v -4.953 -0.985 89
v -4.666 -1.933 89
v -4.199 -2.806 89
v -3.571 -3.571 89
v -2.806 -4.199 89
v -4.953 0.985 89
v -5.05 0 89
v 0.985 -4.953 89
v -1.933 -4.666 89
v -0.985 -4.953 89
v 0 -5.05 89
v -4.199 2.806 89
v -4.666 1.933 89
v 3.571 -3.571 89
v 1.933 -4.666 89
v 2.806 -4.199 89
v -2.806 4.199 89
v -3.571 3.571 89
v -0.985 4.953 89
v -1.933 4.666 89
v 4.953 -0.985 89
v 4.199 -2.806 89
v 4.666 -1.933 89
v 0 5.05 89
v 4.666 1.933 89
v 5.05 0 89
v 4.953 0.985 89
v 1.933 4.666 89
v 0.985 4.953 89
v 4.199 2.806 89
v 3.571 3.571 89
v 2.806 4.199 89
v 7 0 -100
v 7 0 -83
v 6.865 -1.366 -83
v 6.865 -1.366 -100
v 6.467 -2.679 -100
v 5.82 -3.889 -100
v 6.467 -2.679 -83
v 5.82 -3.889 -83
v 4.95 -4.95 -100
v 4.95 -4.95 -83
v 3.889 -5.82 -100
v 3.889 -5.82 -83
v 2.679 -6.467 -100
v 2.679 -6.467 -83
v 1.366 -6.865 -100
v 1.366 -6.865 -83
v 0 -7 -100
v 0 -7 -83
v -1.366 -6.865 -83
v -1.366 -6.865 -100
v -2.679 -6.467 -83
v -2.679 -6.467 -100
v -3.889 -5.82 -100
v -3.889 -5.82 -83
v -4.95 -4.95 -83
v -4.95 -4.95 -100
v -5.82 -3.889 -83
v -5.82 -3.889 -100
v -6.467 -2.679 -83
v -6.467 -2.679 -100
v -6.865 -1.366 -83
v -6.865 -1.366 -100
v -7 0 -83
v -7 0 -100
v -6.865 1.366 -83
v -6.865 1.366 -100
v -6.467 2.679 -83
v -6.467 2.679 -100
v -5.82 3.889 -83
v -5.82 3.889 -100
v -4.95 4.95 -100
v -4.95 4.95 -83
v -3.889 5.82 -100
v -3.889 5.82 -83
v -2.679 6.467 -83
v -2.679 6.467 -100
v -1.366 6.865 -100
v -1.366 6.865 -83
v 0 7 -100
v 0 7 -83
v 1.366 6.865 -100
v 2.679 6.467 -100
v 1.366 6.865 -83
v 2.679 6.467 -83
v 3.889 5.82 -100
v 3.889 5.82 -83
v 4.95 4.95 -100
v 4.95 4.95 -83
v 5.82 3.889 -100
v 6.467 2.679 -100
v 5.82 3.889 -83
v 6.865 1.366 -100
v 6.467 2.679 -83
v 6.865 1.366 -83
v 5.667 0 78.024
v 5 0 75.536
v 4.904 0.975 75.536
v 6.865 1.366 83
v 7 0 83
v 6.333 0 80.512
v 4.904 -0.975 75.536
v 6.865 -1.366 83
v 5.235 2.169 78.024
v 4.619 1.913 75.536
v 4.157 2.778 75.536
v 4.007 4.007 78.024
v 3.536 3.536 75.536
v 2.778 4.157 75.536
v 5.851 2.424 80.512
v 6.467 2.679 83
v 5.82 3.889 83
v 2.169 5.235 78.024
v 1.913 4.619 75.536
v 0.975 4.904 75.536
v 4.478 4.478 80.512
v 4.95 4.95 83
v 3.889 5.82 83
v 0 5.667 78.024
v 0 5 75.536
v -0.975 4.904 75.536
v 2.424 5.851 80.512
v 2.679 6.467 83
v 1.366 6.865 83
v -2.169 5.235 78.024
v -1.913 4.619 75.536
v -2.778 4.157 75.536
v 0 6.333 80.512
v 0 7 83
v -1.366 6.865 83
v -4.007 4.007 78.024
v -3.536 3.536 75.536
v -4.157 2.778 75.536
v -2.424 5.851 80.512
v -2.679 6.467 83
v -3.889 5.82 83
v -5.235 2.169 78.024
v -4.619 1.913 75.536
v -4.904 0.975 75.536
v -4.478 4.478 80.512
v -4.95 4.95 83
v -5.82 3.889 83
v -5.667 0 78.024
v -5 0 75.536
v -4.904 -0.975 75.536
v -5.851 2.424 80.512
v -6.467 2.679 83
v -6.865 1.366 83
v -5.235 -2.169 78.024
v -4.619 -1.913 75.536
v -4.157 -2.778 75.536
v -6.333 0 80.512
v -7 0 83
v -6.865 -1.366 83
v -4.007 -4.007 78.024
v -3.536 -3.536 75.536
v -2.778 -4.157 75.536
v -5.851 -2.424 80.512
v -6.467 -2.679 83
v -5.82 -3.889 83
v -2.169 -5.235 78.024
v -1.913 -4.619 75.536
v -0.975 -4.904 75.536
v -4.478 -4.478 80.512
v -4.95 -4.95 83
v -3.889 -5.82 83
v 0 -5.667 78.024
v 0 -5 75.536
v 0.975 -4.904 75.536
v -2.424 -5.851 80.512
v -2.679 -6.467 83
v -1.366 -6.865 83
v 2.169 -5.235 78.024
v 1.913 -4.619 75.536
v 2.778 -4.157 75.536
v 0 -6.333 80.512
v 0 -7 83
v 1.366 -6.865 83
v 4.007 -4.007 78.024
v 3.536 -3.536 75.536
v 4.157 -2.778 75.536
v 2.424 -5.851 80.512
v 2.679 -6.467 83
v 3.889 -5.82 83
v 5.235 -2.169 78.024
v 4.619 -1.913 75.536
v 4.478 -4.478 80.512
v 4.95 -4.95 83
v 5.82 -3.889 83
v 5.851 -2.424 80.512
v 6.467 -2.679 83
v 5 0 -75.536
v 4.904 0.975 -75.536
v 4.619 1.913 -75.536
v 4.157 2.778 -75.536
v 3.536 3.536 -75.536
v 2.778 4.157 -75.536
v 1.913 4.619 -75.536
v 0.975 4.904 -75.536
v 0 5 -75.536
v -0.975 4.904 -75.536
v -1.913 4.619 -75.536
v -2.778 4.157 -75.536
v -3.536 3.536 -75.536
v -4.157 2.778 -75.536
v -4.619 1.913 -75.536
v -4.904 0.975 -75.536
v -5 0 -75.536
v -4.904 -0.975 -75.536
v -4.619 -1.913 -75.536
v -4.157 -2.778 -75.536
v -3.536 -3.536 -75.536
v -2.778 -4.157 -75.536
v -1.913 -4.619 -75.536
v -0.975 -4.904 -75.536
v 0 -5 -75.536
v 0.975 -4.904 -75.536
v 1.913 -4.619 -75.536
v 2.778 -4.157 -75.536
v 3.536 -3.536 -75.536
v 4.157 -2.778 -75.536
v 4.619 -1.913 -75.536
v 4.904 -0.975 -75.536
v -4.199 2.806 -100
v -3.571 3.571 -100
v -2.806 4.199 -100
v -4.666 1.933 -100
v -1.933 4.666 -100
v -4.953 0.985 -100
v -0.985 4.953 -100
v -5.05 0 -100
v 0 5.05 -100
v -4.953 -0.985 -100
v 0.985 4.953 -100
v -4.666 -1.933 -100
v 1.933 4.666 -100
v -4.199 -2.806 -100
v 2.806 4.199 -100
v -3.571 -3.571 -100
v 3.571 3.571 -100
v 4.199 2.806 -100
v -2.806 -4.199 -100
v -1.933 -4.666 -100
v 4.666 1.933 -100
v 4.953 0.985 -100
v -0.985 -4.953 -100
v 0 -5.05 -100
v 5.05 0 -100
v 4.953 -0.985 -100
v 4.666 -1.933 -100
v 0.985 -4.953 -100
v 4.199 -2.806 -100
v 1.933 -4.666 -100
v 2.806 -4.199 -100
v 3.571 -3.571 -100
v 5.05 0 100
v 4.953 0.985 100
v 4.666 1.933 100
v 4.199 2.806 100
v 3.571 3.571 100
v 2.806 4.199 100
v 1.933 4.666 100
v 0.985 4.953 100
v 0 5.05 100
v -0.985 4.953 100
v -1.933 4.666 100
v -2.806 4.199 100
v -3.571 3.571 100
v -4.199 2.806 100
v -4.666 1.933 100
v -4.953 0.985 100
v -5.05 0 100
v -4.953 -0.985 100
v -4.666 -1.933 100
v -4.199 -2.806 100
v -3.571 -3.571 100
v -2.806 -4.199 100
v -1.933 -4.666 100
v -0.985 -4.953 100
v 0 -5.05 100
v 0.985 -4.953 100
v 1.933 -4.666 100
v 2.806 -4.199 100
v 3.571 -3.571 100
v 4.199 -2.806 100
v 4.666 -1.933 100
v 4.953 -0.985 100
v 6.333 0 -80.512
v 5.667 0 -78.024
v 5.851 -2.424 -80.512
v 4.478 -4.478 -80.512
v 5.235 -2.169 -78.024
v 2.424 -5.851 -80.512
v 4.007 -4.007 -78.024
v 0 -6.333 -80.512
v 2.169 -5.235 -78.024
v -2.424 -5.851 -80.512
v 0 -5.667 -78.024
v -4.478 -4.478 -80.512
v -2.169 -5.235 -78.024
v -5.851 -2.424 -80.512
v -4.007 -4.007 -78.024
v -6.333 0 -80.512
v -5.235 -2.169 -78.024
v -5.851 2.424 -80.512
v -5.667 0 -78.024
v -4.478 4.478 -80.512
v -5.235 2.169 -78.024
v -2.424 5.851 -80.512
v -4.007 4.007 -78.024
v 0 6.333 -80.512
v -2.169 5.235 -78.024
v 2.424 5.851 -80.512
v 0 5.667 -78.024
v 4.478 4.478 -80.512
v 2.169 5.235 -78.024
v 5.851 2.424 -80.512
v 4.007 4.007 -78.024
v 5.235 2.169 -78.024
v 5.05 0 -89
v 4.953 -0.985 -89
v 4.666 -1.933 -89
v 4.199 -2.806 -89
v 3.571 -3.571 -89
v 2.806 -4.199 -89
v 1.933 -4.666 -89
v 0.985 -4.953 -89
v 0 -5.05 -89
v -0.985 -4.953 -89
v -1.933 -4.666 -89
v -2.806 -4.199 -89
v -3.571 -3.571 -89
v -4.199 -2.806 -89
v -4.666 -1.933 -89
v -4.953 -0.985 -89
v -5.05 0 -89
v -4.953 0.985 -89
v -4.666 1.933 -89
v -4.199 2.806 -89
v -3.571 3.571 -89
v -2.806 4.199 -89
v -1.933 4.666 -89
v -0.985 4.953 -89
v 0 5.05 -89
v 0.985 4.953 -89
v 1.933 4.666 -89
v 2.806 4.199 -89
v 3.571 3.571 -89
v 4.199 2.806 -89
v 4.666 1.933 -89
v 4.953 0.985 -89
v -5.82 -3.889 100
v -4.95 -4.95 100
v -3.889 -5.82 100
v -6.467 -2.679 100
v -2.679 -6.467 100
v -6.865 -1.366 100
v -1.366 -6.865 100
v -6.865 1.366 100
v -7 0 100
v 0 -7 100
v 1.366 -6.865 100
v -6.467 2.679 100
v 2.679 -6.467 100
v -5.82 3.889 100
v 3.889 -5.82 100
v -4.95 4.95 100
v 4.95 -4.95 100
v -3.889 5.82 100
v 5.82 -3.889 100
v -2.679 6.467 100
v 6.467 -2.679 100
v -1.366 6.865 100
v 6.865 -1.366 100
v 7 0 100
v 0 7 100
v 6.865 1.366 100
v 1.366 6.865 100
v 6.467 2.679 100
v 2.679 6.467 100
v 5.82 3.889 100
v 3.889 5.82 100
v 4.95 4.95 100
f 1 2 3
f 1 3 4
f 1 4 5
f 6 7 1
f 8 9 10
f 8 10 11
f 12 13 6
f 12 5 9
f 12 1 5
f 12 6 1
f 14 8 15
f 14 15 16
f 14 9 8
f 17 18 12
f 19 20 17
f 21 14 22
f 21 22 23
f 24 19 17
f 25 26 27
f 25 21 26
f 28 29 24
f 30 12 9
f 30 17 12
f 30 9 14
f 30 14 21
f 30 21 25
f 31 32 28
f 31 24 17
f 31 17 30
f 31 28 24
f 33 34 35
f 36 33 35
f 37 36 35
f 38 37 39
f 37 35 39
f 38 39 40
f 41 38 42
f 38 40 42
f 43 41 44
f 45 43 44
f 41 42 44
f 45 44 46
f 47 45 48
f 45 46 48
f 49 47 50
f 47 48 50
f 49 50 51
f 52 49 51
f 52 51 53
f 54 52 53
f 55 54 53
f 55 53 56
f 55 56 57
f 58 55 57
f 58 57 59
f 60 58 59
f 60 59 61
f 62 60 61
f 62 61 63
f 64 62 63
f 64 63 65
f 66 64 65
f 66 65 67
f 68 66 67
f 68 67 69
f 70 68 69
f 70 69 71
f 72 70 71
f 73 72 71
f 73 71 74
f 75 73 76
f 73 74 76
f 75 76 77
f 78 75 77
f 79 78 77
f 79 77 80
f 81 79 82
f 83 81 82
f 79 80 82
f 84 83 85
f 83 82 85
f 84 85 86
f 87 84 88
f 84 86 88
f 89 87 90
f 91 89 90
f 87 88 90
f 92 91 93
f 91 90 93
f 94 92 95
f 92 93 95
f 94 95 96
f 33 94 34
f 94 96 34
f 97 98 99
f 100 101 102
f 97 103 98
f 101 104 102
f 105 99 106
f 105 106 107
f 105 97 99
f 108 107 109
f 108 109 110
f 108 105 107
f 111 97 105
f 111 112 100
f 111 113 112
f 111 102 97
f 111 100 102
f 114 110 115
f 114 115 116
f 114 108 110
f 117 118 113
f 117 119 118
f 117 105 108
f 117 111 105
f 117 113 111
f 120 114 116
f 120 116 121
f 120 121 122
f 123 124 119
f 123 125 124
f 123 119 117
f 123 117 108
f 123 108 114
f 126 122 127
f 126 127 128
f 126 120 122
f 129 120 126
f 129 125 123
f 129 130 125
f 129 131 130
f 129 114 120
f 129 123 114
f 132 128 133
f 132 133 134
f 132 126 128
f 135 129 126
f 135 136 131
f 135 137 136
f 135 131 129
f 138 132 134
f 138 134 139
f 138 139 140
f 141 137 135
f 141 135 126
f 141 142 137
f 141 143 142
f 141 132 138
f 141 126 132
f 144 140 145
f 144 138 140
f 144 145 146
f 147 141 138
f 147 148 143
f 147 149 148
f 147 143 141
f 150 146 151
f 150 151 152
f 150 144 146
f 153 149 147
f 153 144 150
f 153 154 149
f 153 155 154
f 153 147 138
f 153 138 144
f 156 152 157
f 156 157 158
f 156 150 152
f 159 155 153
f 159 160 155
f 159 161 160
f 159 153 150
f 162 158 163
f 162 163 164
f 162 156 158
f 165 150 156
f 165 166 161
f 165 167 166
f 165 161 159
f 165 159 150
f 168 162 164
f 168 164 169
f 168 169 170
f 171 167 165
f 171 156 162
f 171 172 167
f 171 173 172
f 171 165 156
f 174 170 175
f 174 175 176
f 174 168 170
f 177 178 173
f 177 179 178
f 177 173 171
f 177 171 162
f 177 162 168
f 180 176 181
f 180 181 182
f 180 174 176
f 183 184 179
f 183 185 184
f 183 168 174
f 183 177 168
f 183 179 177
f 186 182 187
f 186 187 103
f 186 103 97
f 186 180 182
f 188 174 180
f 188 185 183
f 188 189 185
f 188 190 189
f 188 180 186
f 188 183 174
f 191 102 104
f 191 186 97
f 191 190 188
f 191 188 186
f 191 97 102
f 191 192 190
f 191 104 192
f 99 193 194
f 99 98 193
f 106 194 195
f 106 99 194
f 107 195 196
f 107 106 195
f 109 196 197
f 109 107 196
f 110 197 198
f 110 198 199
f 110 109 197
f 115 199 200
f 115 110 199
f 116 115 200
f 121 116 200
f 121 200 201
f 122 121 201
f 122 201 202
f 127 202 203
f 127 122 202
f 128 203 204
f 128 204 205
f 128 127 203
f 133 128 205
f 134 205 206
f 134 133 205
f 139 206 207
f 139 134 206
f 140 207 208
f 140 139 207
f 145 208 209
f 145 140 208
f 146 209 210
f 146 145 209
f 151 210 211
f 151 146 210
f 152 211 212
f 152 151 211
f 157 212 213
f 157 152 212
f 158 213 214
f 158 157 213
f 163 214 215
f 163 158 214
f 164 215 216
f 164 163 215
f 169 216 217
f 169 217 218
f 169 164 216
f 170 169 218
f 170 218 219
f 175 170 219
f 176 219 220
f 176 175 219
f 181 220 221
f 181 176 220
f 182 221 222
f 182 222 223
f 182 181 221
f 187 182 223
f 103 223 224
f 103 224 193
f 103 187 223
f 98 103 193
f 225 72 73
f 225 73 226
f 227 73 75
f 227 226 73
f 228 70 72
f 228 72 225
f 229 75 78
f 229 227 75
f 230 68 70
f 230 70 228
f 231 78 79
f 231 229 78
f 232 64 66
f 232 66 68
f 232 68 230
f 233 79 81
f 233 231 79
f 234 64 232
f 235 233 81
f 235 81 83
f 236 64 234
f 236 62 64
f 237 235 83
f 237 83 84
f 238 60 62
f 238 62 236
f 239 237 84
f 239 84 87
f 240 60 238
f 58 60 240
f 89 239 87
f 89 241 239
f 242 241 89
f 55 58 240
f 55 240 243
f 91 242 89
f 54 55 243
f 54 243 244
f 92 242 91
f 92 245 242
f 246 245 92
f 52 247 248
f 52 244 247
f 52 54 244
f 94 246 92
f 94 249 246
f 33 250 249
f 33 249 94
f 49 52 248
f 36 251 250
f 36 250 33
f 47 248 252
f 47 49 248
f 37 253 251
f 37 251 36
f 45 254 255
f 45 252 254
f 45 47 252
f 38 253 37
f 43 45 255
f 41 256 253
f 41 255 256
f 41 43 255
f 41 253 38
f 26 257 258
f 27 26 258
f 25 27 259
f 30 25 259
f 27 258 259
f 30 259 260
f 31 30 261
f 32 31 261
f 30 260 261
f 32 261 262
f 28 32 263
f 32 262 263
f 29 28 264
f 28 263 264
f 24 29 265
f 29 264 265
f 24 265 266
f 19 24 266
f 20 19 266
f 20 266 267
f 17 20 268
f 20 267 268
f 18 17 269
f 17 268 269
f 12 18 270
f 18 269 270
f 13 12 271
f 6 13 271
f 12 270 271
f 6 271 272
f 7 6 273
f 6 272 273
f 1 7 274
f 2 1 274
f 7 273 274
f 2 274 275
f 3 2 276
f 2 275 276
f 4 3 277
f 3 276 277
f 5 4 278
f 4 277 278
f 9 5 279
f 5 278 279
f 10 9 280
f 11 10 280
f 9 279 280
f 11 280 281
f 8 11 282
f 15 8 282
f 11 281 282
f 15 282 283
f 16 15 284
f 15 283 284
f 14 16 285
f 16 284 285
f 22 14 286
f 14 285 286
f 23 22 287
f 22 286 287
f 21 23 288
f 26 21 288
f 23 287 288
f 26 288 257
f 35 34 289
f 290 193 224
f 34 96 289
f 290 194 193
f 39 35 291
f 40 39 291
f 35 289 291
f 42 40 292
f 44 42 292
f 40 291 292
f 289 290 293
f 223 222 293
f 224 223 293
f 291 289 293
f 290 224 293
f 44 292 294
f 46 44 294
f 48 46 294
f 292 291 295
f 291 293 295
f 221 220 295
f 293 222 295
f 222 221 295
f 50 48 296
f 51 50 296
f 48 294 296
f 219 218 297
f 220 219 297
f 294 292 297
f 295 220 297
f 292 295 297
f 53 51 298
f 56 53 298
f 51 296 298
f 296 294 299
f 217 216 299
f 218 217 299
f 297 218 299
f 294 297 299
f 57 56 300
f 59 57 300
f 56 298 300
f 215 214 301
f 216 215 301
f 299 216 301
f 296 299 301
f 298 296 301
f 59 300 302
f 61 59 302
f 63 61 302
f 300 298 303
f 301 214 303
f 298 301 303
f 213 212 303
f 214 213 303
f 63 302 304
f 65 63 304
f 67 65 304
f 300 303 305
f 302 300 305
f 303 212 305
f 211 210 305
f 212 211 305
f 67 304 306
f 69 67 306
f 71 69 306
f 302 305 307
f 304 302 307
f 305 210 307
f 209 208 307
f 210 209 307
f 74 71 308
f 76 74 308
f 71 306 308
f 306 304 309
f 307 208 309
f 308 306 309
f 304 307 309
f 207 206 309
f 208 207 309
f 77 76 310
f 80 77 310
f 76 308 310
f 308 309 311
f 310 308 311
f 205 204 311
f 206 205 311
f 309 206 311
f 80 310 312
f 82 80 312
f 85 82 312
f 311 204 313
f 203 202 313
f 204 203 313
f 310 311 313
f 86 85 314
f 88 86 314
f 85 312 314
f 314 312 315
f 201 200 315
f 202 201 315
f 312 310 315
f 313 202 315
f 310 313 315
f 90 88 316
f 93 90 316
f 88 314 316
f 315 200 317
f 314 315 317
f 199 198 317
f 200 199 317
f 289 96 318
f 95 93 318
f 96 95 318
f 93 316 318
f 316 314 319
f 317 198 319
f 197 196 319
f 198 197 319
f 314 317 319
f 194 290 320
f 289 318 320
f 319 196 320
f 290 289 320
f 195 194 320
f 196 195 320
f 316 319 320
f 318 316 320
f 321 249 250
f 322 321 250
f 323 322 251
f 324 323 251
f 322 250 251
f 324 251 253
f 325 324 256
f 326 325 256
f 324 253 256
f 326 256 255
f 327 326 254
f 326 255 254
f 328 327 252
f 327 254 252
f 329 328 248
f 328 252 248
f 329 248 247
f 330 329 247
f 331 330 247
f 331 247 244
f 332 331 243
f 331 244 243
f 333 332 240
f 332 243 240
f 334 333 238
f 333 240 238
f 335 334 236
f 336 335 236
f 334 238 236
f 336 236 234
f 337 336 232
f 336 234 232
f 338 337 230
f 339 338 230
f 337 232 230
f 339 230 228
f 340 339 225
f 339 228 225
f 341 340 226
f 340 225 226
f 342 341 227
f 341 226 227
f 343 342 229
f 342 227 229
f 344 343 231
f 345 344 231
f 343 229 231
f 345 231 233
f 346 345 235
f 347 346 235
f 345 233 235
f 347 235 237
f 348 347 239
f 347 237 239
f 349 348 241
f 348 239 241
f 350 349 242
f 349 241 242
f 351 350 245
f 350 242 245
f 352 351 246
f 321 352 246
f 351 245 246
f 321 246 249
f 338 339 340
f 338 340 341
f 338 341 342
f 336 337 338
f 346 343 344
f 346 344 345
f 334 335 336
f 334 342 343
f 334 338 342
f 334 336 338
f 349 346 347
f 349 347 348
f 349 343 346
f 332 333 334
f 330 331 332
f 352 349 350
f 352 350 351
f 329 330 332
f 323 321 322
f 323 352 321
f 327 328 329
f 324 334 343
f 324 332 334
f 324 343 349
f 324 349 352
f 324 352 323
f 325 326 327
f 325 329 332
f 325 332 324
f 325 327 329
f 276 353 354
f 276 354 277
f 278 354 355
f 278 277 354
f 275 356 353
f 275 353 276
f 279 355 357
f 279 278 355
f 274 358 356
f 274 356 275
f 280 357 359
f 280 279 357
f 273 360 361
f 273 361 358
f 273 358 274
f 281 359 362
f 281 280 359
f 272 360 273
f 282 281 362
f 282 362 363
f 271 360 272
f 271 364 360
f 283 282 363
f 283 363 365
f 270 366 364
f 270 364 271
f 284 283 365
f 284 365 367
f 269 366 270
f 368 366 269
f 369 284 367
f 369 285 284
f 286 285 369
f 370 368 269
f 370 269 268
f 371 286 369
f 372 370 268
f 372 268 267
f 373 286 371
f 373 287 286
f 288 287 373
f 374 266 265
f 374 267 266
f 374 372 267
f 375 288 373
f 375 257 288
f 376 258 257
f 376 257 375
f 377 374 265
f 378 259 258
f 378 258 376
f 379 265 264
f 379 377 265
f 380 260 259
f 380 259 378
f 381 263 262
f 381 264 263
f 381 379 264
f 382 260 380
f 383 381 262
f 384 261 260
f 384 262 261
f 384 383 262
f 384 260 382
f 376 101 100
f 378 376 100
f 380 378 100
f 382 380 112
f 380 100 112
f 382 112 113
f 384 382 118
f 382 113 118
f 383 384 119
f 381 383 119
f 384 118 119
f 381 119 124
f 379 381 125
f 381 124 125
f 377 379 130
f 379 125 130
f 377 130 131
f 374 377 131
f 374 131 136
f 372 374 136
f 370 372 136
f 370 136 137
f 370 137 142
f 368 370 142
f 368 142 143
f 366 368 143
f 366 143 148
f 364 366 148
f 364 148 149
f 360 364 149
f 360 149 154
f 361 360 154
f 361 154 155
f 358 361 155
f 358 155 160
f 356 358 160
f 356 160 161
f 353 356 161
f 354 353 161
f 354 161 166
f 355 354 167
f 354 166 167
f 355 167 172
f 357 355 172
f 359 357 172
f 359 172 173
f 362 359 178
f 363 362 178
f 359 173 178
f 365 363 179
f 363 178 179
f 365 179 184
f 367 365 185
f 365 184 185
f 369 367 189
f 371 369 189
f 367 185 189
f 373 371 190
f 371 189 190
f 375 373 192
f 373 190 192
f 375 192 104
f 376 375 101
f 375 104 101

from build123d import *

# Parameters (mm, degrees)
F0_R         = 5
F1_DEPTH     = 75
F2_R         = 7
F2_R_2       = 5
F4_DEPTH     = 25
F3_R         = 7
F3_R_2       = 5
F5_DEPTH     = 25
F6_S5_R      = 5
F6_T6_DEPTH  = 12
F6_S11_R     = 5
F6_T12_DEPTH = 12
F7_R         = 5.05
F8_DEPTH     = 11
F9_R         = 5.05
F10_DEPTH    = 11


# Not quite as in the source:
# - a fillet or chamfer that OpenCascade refuses, or shapes differently, is made with other operations: its cross-section is extruded or revolved along the edge and cut away or added


with BuildPart() as f1:
    # F0 (on Top) → F1 (new body, symmetric)
    with BuildSketch(Plane.XY):
        Circle(F0_R)
    extrude(amount=F1_DEPTH, both=True)

    # F2 (on face) → F4 (join)
    with BuildSketch(Plane.XY.offset(75)):
        Circle(F2_R)
        Circle(F2_R_2, mode=Mode.SUBTRACT)
        Circle(F2_R_2)
    extrude(amount=F4_DEPTH)

    # F3 (on face) → F5 (join)
    with BuildSketch(Plane(origin=(0, 0, -75), x_dir=(1, 0, 0), z_dir=(0, 0, -1))):
        Circle(F3_R)
        Circle(F3_R_2, mode=Mode.SUBTRACT)
        Circle(F3_R_2)
    extrude(amount=F5_DEPTH)

    # F6: chamfer of 8 x 2.1435935394 on 2 edges, made by hand


with BuildPart() as f6_tool2:
    # F6_s3 → F6_t4 (revolve)
    with BuildSketch(Plane.XZ):
        Polygon((7, -83), (4.8564064606, -75), (7, -75), align=None)
    revolve(axis=Axis((0, 0, -75), (0, 0, -1)))

    # F6_s5 → F6_t6 (cut, symmetric)
    with BuildSketch(Plane.XY.offset(-79)):
        Circle(F6_S5_R)
    extrude(amount=F6_T6_DEPTH, both=True, mode=Mode.SUBTRACT)


with BuildPart() as f1_1:
    add(f1.part)

    # F6_t1: cut F6_tool2
    add(f6_tool2.part, mode=Mode.SUBTRACT)


with BuildPart() as f6_tool8:
    # F6_s9 → F6_t10 (revolve)
    with BuildSketch(Plane.XZ):
        Polygon((4.8564064606, 75), (7, 83), (7, 75), align=None)
    revolve(axis=Axis((0, 0, 75), (0, 0, 1)))

    # F6_s11 → F6_t12 (cut, symmetric)
    with BuildSketch(Plane.XY.offset(79)):
        Circle(F6_S11_R)
    extrude(amount=F6_T12_DEPTH, both=True, mode=Mode.SUBTRACT)


with BuildPart() as f1_2:
    add(f1_1.part)

    # F6_t7: cut F6_tool8
    add(f6_tool8.part, mode=Mode.SUBTRACT)

    # F7 (on face) → F8 (cut)
    with BuildSketch(Plane(origin=(0, 0, -100), x_dir=(1, 0, 0), z_dir=(0, 0, -1))):
        Circle(F7_R)
    extrude(amount=-F8_DEPTH, mode=Mode.SUBTRACT)

    # F9 (on face) → F10 (cut)
    with BuildSketch(Plane.XY.offset(100)):
        Circle(F9_R)
    extrude(amount=-F10_DEPTH, mode=Mode.SUBTRACT)


solid = f1_2.part
